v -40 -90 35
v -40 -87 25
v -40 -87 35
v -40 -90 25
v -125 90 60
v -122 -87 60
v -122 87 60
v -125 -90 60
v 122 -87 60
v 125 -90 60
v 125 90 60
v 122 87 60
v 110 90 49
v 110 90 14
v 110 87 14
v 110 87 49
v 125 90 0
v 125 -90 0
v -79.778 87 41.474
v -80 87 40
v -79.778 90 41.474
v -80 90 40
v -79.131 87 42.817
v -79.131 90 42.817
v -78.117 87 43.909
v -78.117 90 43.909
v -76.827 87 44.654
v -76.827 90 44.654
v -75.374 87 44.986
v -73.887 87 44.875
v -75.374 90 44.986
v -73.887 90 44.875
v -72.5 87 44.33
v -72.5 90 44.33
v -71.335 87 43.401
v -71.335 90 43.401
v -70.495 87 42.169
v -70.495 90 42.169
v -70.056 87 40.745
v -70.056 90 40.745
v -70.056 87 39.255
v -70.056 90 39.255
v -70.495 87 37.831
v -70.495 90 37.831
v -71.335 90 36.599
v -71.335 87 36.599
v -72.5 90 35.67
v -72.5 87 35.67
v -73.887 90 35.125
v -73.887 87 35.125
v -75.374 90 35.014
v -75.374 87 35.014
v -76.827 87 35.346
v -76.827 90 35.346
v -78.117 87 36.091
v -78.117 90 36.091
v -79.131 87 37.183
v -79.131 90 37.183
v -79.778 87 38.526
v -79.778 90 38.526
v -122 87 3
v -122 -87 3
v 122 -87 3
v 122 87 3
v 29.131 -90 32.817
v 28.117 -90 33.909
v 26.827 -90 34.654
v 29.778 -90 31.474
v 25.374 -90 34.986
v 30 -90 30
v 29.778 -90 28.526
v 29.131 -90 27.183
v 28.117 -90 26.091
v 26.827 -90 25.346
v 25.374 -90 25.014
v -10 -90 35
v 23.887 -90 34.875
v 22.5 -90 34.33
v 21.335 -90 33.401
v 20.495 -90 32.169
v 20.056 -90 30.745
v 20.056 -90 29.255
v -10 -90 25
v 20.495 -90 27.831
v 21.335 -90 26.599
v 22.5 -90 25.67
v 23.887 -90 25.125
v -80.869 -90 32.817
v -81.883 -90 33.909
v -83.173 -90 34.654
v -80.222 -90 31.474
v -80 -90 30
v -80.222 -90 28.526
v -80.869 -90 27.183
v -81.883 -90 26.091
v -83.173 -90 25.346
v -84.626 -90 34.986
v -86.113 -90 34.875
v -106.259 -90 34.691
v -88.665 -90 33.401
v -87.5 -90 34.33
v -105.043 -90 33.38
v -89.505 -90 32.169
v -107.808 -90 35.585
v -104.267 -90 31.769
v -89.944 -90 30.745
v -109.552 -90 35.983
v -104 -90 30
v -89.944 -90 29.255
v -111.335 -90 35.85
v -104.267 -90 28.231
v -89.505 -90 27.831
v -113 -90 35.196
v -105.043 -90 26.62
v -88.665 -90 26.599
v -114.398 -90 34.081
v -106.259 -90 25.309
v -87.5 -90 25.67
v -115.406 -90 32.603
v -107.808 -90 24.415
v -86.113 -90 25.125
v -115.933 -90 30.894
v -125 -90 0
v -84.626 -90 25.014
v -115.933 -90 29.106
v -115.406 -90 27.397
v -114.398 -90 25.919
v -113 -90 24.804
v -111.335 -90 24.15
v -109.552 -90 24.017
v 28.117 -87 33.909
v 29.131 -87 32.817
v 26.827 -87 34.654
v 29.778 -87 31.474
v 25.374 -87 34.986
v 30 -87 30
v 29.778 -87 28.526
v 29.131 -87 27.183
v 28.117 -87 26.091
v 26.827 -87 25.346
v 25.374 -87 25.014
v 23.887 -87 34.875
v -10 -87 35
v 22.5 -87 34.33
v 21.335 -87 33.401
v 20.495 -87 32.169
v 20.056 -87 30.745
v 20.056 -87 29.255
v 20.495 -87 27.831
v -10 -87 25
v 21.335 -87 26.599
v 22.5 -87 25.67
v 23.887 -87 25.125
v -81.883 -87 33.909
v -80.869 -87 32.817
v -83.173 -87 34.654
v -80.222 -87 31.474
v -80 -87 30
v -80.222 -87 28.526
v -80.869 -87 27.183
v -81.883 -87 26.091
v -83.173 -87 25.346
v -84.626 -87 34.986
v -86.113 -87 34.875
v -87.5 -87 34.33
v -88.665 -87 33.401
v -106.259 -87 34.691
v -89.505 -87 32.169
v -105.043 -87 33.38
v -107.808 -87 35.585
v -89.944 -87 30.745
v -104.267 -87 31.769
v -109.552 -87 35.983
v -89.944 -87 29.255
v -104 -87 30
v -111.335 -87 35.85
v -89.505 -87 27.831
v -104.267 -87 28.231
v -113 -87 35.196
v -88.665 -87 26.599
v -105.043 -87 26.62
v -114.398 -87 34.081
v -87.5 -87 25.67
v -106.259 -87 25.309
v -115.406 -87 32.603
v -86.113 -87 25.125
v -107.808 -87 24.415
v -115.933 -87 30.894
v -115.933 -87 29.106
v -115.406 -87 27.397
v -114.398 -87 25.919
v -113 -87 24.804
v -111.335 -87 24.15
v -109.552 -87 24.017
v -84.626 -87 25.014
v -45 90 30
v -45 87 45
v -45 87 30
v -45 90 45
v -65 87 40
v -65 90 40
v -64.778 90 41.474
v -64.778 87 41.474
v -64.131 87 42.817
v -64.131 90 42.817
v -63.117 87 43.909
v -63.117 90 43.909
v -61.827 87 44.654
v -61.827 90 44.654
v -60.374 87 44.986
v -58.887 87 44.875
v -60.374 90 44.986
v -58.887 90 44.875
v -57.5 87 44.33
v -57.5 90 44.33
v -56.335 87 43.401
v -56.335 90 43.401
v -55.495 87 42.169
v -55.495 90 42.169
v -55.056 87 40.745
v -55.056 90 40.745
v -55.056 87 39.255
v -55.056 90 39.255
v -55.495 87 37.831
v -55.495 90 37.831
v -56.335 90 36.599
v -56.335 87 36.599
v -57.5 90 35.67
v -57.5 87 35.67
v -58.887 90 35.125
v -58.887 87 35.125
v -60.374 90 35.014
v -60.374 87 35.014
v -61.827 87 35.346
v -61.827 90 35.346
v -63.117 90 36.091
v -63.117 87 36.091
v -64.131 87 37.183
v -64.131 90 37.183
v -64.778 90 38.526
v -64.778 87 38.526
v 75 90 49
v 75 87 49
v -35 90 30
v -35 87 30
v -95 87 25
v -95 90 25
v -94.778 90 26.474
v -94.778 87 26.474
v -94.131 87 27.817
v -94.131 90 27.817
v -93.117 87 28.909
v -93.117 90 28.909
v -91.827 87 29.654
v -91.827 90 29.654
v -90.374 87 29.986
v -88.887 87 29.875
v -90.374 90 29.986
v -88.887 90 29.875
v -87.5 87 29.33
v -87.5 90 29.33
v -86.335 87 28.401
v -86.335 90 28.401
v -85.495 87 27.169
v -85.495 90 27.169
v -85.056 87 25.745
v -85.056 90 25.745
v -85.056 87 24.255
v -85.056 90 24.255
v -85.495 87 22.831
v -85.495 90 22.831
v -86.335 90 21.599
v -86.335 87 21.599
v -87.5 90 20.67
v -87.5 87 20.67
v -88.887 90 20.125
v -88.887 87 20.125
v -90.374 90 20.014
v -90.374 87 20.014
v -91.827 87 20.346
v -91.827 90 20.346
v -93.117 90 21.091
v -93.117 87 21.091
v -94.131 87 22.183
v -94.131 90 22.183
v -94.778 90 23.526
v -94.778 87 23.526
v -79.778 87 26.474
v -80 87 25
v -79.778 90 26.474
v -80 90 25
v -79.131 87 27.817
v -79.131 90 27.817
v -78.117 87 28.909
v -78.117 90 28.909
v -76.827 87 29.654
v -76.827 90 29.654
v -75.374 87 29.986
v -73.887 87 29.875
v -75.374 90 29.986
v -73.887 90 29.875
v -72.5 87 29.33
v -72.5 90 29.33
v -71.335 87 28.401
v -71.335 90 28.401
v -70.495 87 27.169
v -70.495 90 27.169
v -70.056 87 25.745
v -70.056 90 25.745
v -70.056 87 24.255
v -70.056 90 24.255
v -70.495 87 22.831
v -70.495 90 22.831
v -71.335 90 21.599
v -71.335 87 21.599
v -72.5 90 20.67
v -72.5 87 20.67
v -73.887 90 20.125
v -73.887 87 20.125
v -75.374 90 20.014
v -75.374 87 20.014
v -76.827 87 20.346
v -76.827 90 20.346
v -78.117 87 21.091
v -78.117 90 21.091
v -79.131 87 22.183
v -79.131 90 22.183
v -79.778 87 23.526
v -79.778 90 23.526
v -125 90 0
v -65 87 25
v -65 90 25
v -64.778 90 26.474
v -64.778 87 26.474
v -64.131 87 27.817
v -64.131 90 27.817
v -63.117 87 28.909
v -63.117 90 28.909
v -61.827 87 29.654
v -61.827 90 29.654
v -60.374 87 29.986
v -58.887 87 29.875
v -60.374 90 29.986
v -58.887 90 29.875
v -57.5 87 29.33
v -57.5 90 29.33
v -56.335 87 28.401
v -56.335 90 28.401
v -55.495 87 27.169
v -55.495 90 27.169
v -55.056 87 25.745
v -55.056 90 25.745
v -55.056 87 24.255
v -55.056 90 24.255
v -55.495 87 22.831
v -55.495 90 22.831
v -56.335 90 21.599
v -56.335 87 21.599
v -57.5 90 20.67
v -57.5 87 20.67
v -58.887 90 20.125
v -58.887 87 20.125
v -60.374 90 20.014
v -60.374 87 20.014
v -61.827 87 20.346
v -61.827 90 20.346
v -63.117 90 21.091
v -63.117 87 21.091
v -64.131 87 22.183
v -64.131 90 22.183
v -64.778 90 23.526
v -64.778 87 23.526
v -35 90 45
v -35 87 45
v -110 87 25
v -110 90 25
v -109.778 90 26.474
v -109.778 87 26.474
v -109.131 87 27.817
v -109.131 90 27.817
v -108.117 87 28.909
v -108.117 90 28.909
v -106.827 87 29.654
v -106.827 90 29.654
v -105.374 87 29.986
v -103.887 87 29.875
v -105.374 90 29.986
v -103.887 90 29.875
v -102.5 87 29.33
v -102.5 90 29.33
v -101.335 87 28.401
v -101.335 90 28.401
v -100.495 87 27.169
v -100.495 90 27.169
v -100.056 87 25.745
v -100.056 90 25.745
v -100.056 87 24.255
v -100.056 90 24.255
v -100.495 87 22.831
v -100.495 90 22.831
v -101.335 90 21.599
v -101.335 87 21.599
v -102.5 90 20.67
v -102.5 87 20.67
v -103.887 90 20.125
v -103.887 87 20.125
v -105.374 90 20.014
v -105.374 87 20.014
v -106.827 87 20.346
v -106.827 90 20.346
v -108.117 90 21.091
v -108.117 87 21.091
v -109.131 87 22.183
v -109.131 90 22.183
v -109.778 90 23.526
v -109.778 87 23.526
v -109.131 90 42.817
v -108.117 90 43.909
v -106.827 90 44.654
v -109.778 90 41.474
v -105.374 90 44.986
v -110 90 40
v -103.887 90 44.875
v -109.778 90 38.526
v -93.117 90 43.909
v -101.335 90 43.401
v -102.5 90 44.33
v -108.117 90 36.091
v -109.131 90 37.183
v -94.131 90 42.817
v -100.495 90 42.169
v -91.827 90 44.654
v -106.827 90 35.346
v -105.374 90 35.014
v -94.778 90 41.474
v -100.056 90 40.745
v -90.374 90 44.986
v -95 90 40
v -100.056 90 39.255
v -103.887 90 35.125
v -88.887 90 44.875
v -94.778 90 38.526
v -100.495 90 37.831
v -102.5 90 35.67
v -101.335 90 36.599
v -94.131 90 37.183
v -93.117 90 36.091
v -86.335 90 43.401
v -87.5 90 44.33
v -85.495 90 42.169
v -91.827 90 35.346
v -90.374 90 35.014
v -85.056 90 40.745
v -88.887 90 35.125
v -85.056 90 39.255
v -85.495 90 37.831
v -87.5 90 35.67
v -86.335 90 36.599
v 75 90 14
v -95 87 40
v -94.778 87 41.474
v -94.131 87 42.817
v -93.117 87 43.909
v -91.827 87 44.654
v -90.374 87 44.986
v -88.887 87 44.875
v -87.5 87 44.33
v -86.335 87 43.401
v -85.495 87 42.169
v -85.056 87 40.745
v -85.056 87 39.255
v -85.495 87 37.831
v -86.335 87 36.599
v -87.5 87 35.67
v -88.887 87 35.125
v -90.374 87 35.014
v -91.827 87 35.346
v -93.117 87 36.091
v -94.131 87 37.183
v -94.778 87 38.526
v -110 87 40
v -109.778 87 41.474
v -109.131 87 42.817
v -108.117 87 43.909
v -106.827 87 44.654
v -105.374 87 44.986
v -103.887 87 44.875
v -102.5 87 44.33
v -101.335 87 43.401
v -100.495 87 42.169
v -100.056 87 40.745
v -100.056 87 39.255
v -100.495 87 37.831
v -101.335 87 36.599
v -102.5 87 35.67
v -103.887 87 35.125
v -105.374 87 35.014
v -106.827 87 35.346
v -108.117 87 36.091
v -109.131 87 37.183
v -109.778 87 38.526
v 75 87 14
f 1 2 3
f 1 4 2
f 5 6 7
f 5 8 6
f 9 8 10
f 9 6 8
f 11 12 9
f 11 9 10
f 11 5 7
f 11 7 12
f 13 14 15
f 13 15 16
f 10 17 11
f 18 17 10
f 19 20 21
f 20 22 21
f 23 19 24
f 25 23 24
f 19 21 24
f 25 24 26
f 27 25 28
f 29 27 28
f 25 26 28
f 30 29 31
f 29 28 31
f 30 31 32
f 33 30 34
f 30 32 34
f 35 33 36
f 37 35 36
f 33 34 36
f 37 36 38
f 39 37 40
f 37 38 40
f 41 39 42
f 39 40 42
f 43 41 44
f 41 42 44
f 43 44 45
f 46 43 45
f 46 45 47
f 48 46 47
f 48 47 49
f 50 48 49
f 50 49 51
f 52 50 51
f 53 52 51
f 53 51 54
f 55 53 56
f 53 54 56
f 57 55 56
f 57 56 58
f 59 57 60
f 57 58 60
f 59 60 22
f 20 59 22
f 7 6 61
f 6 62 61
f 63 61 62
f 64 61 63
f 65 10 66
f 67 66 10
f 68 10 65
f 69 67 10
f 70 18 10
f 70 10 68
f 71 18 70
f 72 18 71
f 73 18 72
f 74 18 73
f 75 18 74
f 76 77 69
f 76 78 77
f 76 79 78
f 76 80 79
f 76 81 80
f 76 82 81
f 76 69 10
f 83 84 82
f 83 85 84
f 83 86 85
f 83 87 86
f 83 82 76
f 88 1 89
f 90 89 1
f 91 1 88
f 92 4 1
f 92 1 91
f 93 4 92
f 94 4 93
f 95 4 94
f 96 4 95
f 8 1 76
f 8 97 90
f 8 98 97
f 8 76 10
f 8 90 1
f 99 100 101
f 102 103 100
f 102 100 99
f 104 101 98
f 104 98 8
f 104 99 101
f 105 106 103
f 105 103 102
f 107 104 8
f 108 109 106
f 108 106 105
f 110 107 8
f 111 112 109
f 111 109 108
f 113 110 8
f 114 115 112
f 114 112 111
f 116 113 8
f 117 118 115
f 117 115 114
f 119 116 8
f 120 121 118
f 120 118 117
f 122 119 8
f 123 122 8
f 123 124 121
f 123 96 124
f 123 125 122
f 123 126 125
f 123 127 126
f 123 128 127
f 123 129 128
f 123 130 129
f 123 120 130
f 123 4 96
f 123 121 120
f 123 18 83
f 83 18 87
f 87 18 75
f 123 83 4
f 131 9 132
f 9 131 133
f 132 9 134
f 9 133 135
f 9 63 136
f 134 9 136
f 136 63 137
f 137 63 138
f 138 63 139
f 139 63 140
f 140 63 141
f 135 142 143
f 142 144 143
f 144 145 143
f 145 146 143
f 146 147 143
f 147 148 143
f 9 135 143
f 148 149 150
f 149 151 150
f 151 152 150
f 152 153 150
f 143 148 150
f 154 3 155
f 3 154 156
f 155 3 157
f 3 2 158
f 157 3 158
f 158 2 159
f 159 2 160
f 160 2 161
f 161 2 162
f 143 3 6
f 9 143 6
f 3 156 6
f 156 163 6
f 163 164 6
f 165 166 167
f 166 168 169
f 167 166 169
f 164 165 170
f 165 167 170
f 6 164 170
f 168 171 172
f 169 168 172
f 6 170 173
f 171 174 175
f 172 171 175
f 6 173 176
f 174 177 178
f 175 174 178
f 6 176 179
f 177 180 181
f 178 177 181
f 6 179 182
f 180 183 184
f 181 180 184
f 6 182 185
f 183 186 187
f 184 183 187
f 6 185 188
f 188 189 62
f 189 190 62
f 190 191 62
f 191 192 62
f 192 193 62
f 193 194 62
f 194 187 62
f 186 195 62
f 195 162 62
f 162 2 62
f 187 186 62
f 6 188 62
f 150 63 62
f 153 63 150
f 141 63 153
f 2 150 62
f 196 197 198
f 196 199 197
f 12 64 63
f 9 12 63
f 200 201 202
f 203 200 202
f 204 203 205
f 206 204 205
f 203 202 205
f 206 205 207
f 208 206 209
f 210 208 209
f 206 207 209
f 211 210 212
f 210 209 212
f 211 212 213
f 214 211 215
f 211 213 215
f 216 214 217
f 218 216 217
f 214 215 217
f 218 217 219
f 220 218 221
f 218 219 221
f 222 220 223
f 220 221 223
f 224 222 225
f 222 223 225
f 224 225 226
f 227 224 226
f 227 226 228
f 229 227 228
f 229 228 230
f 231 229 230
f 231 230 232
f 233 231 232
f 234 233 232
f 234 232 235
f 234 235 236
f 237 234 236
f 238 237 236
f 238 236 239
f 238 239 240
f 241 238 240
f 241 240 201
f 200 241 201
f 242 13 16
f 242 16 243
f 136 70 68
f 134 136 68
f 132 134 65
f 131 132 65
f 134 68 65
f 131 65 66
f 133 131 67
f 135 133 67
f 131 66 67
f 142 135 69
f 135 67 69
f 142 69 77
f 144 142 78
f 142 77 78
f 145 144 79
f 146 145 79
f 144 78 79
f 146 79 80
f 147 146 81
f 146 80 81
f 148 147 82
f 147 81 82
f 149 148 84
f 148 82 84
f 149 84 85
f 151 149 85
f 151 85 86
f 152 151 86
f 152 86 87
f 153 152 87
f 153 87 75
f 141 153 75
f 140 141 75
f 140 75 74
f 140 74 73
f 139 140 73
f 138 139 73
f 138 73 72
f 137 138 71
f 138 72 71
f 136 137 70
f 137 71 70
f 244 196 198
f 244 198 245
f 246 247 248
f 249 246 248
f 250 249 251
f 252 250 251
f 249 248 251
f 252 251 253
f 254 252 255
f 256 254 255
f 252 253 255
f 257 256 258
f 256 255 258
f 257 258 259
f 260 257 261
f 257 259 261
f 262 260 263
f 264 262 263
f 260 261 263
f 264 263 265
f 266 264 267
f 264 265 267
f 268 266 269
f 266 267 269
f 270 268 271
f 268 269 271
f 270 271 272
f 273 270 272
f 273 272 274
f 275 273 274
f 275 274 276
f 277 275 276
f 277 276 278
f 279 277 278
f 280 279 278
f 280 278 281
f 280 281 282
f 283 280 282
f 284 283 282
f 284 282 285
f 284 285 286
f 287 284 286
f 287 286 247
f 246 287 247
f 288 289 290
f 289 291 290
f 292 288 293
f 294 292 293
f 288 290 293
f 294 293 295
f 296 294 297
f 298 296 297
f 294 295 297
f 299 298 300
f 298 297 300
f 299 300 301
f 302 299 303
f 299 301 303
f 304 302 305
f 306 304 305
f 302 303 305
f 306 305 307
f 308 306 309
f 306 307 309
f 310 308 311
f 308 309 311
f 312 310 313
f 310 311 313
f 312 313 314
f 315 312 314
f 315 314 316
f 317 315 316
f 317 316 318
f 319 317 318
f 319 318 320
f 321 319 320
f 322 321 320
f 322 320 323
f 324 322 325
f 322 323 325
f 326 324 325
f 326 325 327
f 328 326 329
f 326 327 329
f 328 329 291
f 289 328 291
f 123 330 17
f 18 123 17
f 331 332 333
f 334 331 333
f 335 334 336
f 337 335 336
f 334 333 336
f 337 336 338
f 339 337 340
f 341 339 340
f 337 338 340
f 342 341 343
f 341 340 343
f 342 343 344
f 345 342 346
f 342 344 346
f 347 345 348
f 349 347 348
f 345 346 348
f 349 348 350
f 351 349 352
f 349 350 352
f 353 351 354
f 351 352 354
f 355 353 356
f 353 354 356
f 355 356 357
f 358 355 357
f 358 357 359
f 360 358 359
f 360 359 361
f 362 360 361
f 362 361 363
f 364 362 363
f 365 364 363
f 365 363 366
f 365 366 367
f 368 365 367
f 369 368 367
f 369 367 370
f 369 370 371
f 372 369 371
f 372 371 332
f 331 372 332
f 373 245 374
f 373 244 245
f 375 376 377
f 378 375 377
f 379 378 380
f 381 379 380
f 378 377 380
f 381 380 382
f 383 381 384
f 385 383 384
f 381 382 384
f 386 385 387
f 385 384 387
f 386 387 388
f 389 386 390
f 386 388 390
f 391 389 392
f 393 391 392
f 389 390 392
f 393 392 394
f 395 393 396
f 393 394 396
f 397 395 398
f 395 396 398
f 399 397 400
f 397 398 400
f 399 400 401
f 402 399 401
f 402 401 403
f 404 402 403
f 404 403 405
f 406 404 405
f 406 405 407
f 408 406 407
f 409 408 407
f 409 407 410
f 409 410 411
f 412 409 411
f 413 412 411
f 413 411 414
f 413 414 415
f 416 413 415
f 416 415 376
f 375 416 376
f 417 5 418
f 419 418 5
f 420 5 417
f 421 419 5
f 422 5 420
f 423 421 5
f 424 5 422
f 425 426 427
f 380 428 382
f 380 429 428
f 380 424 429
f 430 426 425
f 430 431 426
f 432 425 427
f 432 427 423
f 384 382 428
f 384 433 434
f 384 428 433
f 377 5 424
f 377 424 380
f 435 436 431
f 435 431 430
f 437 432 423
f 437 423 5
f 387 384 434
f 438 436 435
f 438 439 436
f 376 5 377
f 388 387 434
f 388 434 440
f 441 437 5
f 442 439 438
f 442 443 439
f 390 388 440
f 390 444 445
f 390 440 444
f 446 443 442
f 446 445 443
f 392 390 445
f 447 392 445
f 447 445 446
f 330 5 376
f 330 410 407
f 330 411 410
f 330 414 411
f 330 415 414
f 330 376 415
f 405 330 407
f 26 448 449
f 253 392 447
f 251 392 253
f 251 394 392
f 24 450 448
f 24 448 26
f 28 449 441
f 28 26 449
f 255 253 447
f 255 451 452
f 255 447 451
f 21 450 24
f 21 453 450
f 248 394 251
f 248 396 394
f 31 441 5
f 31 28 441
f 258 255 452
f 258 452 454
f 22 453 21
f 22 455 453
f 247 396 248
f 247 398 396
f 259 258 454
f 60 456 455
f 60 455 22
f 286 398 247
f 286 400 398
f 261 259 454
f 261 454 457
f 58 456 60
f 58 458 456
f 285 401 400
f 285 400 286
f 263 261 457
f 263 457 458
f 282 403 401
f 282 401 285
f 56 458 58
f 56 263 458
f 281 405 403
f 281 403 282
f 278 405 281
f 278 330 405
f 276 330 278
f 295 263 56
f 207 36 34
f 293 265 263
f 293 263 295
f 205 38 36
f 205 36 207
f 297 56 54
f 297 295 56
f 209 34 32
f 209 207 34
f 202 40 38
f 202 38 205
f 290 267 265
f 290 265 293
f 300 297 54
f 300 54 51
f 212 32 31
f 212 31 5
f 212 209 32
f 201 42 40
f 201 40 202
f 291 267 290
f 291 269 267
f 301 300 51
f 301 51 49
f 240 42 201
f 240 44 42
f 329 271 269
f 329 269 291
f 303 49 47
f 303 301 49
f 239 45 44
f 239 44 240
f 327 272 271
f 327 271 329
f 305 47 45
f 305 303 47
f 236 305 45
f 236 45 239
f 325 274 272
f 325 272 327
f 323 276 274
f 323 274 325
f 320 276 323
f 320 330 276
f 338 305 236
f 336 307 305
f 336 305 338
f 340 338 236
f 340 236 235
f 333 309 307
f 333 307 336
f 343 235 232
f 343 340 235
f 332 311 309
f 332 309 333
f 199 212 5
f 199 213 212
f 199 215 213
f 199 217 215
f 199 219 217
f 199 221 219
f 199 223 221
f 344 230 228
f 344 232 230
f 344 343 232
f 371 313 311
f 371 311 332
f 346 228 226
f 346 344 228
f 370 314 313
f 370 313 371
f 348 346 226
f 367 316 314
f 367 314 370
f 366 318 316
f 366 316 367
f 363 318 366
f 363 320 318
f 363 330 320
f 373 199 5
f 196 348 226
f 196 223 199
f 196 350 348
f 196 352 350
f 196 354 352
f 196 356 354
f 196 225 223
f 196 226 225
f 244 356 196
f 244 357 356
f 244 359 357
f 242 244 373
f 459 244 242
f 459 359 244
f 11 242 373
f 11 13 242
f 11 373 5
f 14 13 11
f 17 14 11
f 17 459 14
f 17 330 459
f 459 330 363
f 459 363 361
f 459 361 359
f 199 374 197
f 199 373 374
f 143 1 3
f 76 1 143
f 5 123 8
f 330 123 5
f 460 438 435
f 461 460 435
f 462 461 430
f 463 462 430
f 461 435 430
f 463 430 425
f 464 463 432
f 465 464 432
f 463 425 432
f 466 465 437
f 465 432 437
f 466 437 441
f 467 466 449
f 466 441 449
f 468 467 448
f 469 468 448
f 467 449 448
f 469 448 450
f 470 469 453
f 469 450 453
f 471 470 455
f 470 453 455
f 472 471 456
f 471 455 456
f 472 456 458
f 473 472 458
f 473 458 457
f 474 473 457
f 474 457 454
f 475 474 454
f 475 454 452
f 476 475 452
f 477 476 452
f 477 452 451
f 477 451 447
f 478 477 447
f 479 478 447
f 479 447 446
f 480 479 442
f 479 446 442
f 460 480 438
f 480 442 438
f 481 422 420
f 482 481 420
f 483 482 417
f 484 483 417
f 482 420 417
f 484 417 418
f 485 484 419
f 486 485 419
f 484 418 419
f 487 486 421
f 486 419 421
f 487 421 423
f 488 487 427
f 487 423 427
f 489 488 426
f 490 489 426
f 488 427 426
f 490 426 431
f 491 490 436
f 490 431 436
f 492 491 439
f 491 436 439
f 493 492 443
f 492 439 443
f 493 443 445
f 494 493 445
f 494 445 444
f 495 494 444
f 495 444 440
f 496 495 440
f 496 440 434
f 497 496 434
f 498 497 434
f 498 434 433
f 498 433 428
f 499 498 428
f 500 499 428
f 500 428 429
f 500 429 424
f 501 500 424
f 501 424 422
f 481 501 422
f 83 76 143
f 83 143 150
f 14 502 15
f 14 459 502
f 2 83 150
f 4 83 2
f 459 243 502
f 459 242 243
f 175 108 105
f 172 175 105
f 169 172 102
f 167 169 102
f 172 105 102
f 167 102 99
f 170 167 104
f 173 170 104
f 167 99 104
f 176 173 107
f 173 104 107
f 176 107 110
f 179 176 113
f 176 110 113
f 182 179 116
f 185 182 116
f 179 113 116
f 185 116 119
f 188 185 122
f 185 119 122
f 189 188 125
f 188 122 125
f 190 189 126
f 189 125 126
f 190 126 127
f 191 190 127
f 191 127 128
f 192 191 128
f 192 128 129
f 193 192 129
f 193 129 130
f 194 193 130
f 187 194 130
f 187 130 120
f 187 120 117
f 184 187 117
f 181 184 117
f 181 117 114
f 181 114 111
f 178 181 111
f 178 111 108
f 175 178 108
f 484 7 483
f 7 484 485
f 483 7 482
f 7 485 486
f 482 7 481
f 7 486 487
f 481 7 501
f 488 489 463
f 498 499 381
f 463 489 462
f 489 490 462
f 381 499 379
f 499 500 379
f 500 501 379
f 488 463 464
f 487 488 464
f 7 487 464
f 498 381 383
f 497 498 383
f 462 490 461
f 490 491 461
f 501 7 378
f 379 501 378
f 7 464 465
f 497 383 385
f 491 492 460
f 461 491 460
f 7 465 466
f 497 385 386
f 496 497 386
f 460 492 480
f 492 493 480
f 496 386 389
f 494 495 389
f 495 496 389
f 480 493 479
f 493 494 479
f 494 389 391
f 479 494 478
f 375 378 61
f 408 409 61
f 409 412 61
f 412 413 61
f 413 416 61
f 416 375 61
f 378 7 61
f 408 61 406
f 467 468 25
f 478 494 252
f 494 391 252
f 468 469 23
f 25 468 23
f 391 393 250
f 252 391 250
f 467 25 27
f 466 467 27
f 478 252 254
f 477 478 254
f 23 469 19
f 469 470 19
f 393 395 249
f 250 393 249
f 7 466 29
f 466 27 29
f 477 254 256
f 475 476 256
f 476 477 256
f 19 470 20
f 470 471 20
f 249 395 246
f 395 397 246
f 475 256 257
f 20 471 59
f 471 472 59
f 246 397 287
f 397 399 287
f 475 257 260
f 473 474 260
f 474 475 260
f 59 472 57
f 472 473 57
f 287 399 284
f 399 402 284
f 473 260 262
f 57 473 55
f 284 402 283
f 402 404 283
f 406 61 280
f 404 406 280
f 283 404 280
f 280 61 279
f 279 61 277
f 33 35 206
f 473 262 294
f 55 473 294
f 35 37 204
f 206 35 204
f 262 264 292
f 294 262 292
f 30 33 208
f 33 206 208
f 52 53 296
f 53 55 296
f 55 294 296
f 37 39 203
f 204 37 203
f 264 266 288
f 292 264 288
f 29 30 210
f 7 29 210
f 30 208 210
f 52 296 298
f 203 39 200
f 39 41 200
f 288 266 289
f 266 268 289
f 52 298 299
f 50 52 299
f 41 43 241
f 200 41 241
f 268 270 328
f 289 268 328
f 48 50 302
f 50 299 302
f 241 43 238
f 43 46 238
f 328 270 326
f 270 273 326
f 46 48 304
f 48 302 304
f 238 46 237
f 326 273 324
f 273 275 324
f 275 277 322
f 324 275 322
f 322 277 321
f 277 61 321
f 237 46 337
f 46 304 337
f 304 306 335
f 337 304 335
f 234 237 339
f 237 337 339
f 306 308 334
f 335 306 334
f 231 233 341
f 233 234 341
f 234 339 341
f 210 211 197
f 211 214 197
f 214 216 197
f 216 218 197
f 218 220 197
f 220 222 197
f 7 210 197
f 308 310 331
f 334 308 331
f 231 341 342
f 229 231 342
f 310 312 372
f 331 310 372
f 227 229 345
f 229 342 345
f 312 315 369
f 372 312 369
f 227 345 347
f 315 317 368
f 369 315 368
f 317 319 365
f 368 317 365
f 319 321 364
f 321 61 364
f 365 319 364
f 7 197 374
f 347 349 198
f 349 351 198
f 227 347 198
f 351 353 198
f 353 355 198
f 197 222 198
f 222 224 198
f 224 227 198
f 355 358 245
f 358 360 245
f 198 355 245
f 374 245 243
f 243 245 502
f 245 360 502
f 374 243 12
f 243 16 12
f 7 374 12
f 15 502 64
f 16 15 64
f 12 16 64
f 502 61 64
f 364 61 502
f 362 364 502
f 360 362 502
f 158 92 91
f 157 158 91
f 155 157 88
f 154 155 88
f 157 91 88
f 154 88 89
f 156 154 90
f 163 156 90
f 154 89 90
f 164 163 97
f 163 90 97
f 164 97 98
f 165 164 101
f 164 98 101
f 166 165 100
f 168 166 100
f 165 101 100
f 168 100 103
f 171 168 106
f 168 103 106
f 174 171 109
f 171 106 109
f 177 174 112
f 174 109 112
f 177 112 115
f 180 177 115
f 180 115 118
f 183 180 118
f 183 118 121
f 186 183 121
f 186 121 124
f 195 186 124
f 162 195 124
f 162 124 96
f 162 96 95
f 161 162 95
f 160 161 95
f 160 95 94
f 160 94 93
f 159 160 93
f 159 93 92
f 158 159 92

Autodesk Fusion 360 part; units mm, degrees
sketch "Sketch1" plane through (0, 0, 0) normal (0, 0, 1) x (1, 0, 0)
  line L0 (-125, 90) -> (125, 90)
  line L1 (125, 90) -> (125, -90)
  line L2 (125, -90) -> (-125, -90)
  line L3 (-125, -90) -> (-125, 90)
  dimension "d1" = 250
  dimension "d2" = 180
  dimension "d3" = 90
  dimension "d4" = 125
extrude "Extrude1" add sketch "Sketch1" along normal blind 60
shell "Shell1" thickness 3 removed faces 1 at (-41.6667, 30, 60)
sketch "Sketch2" plane through (0, -90, 0) normal (0, -1, 0) x (1, 0, 0)
  line L0 (-125, 0) -> (125, 0)
  line L1 (125, 0) -> (125, 60)
  line L2 (125, 60) -> (-125, 60)
  line L3 (-125, 60) -> (-125, 0)
  circle A0 centre (-85, 30) radius 5
  circle A1 centre (25, 30) radius 5
  line L4 (-40, 35) -> (-10, 35)
  line L5 (-10, 35) -> (-10, 25)
  line L6 (-10, 25) -> (-40, 25)
  line L7 (-40, 25) -> (-40, 35)
  circle A2 centre (-110, 30) radius 6
  dimension "d8" = 10
  dimension "d9" = 10
  dimension "d10" = 12
extrude "Extrude2" cut sketch "Sketch2" against normal blind 10 contours A0 | A1 | L4 L5 L6 L7 | A2
sketch "Sketch3" plane through (0, 90, 0) normal (0, 1, 0) x (-1, 0, 0)
  line L0 (-125, 0) -> (125, 0)
  line L1 (125, 0) -> (125, 60)
  line L2 (125, 60) -> (-125, 60)
  line L3 (-125, 60) -> (-125, 0)
  circle A0 centre (105, 40) radius 5
  circle A1 centre (105, 25) radius 5
  circle A2 centre (90, 25) radius 5
  circle A3 centre (90, 40) radius 5
  circle A4 centre (105, 25) radius 5
  circle A5 centre (60, 25) radius 5
  circle A6 centre (75, 25) radius 5
  circle A7 centre (75, 25) radius 5
  circle A8 centre (75, 40) radius 5
  circle A9 centre (60, 40) radius 5
  line L4 (35, 45) -> (45, 45)
  line L5 (45, 45) -> (45, 30)
  line L6 (45, 30) -> (35, 30)
  line L7 (35, 30) -> (35, 45)
  line L8 (-110, 49) -> (-75, 49)
  line L9 (-75, 49) -> (-75, 14)
  line L10 (-75, 14) -> (-110, 14)
  line L11 (-110, 14) -> (-110, 49)
  dimension "d13" = 10
  dimension "d14" = 10
  dimension "d15" = 10
  dimension "d16" = 10
  dimension "d17" = 10
  dimension "d18" = 10
  dimension "d19" = 10
  dimension "d20" = 10
  dimension "d21" = 10
  dimension "d22" = 10
extrude "Extrude3" cut sketch "Sketch3" against normal blind 10 contours A0 | A1 A4 | A2 | A3 | A5 | A6 A7 | A8 | A9 | L4 L5 L6 L7 | L8 L9 L10 L11
